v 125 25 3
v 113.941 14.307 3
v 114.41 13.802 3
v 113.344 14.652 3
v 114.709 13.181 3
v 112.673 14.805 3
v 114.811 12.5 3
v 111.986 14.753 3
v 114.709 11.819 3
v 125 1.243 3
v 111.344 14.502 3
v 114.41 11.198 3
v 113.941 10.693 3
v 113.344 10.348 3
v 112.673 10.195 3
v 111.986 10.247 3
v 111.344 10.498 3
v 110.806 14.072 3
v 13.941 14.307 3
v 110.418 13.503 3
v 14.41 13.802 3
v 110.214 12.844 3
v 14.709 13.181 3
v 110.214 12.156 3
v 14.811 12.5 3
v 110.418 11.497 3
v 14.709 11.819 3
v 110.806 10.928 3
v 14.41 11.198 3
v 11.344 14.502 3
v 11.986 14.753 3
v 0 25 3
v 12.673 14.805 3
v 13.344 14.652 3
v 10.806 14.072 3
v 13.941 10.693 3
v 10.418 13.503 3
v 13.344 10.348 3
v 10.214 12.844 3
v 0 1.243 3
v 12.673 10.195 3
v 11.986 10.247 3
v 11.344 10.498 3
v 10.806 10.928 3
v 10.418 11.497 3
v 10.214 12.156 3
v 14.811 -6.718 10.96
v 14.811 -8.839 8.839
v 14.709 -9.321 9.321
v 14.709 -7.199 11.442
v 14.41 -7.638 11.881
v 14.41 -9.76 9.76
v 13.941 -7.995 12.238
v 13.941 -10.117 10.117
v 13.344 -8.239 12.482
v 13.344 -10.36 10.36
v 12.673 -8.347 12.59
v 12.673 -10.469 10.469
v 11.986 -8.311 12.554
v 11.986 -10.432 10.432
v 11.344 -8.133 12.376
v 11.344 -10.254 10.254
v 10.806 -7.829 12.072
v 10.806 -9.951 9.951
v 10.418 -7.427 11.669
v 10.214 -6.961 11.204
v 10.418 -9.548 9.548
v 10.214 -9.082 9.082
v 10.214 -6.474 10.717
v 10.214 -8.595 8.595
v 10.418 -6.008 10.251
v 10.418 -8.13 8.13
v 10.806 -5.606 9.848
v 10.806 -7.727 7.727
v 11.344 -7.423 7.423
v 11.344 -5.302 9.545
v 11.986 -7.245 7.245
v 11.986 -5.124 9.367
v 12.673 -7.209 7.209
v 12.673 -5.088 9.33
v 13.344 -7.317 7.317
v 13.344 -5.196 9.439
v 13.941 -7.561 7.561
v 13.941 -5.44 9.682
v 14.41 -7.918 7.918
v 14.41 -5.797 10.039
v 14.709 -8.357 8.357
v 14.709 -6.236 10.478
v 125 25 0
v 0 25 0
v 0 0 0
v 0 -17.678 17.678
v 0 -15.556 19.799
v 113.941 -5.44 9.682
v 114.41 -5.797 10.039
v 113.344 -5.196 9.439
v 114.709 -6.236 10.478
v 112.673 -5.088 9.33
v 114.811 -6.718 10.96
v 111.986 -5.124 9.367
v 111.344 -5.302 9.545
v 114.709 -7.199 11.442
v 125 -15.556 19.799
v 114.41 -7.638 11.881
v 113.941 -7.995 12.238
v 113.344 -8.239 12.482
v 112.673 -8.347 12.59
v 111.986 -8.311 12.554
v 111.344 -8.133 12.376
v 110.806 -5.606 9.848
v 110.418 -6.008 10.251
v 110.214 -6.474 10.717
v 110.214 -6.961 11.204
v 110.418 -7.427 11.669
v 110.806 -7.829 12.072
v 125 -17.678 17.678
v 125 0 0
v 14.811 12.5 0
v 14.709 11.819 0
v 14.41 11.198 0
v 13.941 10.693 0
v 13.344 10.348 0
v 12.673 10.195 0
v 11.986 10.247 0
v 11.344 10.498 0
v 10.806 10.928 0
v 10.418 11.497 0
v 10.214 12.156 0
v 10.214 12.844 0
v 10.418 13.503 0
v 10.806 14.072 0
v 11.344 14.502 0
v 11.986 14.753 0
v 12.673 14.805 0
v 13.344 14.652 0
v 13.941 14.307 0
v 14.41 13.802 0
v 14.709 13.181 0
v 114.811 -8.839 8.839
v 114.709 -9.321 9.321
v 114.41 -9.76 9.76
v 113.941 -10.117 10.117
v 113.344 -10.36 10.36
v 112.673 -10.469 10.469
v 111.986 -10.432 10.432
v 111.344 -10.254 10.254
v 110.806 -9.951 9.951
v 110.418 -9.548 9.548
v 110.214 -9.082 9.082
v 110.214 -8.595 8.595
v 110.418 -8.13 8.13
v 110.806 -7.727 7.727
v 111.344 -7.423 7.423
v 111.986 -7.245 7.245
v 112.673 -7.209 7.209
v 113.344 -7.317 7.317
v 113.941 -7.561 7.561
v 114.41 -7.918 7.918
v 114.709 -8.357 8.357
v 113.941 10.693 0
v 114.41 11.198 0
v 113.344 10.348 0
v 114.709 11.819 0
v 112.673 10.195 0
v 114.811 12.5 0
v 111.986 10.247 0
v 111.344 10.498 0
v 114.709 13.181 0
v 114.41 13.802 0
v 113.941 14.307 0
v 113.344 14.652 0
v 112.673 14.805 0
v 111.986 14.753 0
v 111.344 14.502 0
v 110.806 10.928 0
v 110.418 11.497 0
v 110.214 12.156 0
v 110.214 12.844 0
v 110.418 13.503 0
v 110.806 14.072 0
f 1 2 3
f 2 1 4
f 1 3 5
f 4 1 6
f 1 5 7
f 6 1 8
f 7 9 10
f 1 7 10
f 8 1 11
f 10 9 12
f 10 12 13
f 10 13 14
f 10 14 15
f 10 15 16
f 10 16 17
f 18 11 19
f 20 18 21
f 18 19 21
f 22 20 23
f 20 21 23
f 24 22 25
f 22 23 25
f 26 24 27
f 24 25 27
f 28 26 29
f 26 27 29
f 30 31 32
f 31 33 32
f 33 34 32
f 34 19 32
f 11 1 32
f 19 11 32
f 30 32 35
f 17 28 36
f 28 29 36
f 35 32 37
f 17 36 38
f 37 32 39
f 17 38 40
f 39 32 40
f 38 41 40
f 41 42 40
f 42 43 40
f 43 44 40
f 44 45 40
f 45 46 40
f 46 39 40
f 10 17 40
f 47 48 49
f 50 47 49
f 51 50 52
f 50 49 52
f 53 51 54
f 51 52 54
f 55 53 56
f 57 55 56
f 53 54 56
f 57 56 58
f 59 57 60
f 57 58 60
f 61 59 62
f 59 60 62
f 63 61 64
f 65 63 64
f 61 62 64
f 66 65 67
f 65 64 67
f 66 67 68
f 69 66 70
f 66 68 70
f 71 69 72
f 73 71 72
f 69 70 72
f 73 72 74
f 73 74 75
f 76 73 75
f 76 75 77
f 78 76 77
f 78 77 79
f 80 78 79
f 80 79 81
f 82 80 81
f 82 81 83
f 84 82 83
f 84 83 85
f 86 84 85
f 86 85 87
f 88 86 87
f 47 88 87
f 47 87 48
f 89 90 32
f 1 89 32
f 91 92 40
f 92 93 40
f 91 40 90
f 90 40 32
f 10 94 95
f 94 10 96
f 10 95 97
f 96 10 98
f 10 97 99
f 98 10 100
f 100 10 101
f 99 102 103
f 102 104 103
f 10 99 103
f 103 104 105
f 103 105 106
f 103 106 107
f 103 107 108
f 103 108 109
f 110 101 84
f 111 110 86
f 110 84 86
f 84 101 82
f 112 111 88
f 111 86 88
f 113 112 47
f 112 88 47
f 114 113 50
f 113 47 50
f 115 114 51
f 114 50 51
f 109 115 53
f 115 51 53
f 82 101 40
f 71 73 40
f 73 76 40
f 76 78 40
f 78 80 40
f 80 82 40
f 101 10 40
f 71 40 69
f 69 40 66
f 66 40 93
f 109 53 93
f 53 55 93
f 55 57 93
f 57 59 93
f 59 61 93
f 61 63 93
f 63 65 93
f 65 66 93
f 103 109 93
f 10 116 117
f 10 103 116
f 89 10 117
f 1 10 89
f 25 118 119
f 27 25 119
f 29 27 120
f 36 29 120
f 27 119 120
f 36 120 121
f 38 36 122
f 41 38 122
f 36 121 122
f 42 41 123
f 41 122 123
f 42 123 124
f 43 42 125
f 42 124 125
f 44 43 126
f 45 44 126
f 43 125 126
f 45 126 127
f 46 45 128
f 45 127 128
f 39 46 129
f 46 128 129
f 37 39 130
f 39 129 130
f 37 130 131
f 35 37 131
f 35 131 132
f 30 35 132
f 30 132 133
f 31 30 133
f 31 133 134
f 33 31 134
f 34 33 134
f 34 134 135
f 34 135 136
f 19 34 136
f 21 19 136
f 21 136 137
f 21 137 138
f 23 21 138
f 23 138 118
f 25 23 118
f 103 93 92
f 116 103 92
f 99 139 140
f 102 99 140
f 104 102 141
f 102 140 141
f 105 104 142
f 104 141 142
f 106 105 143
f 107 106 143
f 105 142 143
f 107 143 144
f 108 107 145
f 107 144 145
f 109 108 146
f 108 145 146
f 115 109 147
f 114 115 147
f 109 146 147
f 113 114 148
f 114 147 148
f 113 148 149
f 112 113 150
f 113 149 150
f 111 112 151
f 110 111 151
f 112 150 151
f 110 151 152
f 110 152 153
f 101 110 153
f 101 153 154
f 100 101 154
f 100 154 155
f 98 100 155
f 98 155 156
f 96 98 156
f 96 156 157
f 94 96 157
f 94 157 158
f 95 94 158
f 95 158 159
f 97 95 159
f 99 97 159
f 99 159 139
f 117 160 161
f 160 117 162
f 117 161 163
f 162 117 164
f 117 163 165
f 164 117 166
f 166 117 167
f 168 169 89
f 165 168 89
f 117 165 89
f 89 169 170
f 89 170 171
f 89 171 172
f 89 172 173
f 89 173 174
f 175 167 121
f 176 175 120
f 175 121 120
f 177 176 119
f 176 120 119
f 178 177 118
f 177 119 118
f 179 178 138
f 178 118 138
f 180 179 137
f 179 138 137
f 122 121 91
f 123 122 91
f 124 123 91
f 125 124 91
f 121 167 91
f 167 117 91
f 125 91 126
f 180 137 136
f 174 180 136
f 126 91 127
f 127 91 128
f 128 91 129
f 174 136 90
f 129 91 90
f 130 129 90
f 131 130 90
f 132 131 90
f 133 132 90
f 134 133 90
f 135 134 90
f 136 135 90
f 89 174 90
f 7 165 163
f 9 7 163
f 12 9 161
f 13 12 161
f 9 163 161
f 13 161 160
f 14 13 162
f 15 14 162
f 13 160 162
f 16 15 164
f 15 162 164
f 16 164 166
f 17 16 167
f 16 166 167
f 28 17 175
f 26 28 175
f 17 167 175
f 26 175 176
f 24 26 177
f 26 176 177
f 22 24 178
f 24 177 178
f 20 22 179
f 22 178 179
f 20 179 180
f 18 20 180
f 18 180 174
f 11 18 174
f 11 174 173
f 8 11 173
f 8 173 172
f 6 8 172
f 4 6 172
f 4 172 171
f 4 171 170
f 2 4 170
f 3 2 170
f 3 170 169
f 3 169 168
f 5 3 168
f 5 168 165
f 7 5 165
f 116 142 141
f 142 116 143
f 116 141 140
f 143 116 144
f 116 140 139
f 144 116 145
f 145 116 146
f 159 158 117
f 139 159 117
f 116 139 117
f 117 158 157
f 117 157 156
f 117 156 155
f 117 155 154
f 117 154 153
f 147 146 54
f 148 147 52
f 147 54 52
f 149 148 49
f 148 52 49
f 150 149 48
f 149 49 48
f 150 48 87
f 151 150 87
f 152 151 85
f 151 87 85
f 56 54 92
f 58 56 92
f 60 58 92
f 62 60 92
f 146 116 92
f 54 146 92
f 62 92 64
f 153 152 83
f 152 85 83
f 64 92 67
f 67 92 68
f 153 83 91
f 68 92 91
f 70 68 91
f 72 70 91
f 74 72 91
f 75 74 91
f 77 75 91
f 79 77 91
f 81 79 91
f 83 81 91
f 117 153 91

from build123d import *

# Parameters (mm, degrees)
F1_DEPTH = 125
F2_R     = 2.3114
F3_DEPTH = 25
F4_R     = 2.3114
F5_DEPTH = 25


with BuildPart() as f1:
    # F0 (on Right) → F1 (new body)
    with BuildSketch(Plane.YZ):
        Polygon((-17.67767, 17.67767), (0, 0), (25, 0), (25, 3), (1.242641, 3), (-15.556349, 19.79899), align=None)
    extrude(amount=F1_DEPTH)

    # F2 (on face) → F3 (cut)
    with BuildSketch(Plane(origin=(0, 0, 0), x_dir=(1, 0, 0), z_dir=(0, 0, -1))):
        with Locations((12.5, -12.5)):
            Circle(F2_R)
        with Locations((112.5, -12.5)):
            Circle(F2_R)
    extrude(amount=-F3_DEPTH, mode=Mode.SUBTRACT)

    # F4 (on face) → F5 (cut)
    with BuildSketch(Plane(origin=(0, 0, 0), x_dir=(1, 0, 0), z_dir=(0, -0.707107, -0.707107))):
        with Locations((12.5, 12.5)):
            Circle(F4_R)
        with Locations((112.5, 12.5)):
            Circle(F4_R)
    extrude(amount=-F5_DEPTH, mode=Mode.SUBTRACT)


solid = f1.part
